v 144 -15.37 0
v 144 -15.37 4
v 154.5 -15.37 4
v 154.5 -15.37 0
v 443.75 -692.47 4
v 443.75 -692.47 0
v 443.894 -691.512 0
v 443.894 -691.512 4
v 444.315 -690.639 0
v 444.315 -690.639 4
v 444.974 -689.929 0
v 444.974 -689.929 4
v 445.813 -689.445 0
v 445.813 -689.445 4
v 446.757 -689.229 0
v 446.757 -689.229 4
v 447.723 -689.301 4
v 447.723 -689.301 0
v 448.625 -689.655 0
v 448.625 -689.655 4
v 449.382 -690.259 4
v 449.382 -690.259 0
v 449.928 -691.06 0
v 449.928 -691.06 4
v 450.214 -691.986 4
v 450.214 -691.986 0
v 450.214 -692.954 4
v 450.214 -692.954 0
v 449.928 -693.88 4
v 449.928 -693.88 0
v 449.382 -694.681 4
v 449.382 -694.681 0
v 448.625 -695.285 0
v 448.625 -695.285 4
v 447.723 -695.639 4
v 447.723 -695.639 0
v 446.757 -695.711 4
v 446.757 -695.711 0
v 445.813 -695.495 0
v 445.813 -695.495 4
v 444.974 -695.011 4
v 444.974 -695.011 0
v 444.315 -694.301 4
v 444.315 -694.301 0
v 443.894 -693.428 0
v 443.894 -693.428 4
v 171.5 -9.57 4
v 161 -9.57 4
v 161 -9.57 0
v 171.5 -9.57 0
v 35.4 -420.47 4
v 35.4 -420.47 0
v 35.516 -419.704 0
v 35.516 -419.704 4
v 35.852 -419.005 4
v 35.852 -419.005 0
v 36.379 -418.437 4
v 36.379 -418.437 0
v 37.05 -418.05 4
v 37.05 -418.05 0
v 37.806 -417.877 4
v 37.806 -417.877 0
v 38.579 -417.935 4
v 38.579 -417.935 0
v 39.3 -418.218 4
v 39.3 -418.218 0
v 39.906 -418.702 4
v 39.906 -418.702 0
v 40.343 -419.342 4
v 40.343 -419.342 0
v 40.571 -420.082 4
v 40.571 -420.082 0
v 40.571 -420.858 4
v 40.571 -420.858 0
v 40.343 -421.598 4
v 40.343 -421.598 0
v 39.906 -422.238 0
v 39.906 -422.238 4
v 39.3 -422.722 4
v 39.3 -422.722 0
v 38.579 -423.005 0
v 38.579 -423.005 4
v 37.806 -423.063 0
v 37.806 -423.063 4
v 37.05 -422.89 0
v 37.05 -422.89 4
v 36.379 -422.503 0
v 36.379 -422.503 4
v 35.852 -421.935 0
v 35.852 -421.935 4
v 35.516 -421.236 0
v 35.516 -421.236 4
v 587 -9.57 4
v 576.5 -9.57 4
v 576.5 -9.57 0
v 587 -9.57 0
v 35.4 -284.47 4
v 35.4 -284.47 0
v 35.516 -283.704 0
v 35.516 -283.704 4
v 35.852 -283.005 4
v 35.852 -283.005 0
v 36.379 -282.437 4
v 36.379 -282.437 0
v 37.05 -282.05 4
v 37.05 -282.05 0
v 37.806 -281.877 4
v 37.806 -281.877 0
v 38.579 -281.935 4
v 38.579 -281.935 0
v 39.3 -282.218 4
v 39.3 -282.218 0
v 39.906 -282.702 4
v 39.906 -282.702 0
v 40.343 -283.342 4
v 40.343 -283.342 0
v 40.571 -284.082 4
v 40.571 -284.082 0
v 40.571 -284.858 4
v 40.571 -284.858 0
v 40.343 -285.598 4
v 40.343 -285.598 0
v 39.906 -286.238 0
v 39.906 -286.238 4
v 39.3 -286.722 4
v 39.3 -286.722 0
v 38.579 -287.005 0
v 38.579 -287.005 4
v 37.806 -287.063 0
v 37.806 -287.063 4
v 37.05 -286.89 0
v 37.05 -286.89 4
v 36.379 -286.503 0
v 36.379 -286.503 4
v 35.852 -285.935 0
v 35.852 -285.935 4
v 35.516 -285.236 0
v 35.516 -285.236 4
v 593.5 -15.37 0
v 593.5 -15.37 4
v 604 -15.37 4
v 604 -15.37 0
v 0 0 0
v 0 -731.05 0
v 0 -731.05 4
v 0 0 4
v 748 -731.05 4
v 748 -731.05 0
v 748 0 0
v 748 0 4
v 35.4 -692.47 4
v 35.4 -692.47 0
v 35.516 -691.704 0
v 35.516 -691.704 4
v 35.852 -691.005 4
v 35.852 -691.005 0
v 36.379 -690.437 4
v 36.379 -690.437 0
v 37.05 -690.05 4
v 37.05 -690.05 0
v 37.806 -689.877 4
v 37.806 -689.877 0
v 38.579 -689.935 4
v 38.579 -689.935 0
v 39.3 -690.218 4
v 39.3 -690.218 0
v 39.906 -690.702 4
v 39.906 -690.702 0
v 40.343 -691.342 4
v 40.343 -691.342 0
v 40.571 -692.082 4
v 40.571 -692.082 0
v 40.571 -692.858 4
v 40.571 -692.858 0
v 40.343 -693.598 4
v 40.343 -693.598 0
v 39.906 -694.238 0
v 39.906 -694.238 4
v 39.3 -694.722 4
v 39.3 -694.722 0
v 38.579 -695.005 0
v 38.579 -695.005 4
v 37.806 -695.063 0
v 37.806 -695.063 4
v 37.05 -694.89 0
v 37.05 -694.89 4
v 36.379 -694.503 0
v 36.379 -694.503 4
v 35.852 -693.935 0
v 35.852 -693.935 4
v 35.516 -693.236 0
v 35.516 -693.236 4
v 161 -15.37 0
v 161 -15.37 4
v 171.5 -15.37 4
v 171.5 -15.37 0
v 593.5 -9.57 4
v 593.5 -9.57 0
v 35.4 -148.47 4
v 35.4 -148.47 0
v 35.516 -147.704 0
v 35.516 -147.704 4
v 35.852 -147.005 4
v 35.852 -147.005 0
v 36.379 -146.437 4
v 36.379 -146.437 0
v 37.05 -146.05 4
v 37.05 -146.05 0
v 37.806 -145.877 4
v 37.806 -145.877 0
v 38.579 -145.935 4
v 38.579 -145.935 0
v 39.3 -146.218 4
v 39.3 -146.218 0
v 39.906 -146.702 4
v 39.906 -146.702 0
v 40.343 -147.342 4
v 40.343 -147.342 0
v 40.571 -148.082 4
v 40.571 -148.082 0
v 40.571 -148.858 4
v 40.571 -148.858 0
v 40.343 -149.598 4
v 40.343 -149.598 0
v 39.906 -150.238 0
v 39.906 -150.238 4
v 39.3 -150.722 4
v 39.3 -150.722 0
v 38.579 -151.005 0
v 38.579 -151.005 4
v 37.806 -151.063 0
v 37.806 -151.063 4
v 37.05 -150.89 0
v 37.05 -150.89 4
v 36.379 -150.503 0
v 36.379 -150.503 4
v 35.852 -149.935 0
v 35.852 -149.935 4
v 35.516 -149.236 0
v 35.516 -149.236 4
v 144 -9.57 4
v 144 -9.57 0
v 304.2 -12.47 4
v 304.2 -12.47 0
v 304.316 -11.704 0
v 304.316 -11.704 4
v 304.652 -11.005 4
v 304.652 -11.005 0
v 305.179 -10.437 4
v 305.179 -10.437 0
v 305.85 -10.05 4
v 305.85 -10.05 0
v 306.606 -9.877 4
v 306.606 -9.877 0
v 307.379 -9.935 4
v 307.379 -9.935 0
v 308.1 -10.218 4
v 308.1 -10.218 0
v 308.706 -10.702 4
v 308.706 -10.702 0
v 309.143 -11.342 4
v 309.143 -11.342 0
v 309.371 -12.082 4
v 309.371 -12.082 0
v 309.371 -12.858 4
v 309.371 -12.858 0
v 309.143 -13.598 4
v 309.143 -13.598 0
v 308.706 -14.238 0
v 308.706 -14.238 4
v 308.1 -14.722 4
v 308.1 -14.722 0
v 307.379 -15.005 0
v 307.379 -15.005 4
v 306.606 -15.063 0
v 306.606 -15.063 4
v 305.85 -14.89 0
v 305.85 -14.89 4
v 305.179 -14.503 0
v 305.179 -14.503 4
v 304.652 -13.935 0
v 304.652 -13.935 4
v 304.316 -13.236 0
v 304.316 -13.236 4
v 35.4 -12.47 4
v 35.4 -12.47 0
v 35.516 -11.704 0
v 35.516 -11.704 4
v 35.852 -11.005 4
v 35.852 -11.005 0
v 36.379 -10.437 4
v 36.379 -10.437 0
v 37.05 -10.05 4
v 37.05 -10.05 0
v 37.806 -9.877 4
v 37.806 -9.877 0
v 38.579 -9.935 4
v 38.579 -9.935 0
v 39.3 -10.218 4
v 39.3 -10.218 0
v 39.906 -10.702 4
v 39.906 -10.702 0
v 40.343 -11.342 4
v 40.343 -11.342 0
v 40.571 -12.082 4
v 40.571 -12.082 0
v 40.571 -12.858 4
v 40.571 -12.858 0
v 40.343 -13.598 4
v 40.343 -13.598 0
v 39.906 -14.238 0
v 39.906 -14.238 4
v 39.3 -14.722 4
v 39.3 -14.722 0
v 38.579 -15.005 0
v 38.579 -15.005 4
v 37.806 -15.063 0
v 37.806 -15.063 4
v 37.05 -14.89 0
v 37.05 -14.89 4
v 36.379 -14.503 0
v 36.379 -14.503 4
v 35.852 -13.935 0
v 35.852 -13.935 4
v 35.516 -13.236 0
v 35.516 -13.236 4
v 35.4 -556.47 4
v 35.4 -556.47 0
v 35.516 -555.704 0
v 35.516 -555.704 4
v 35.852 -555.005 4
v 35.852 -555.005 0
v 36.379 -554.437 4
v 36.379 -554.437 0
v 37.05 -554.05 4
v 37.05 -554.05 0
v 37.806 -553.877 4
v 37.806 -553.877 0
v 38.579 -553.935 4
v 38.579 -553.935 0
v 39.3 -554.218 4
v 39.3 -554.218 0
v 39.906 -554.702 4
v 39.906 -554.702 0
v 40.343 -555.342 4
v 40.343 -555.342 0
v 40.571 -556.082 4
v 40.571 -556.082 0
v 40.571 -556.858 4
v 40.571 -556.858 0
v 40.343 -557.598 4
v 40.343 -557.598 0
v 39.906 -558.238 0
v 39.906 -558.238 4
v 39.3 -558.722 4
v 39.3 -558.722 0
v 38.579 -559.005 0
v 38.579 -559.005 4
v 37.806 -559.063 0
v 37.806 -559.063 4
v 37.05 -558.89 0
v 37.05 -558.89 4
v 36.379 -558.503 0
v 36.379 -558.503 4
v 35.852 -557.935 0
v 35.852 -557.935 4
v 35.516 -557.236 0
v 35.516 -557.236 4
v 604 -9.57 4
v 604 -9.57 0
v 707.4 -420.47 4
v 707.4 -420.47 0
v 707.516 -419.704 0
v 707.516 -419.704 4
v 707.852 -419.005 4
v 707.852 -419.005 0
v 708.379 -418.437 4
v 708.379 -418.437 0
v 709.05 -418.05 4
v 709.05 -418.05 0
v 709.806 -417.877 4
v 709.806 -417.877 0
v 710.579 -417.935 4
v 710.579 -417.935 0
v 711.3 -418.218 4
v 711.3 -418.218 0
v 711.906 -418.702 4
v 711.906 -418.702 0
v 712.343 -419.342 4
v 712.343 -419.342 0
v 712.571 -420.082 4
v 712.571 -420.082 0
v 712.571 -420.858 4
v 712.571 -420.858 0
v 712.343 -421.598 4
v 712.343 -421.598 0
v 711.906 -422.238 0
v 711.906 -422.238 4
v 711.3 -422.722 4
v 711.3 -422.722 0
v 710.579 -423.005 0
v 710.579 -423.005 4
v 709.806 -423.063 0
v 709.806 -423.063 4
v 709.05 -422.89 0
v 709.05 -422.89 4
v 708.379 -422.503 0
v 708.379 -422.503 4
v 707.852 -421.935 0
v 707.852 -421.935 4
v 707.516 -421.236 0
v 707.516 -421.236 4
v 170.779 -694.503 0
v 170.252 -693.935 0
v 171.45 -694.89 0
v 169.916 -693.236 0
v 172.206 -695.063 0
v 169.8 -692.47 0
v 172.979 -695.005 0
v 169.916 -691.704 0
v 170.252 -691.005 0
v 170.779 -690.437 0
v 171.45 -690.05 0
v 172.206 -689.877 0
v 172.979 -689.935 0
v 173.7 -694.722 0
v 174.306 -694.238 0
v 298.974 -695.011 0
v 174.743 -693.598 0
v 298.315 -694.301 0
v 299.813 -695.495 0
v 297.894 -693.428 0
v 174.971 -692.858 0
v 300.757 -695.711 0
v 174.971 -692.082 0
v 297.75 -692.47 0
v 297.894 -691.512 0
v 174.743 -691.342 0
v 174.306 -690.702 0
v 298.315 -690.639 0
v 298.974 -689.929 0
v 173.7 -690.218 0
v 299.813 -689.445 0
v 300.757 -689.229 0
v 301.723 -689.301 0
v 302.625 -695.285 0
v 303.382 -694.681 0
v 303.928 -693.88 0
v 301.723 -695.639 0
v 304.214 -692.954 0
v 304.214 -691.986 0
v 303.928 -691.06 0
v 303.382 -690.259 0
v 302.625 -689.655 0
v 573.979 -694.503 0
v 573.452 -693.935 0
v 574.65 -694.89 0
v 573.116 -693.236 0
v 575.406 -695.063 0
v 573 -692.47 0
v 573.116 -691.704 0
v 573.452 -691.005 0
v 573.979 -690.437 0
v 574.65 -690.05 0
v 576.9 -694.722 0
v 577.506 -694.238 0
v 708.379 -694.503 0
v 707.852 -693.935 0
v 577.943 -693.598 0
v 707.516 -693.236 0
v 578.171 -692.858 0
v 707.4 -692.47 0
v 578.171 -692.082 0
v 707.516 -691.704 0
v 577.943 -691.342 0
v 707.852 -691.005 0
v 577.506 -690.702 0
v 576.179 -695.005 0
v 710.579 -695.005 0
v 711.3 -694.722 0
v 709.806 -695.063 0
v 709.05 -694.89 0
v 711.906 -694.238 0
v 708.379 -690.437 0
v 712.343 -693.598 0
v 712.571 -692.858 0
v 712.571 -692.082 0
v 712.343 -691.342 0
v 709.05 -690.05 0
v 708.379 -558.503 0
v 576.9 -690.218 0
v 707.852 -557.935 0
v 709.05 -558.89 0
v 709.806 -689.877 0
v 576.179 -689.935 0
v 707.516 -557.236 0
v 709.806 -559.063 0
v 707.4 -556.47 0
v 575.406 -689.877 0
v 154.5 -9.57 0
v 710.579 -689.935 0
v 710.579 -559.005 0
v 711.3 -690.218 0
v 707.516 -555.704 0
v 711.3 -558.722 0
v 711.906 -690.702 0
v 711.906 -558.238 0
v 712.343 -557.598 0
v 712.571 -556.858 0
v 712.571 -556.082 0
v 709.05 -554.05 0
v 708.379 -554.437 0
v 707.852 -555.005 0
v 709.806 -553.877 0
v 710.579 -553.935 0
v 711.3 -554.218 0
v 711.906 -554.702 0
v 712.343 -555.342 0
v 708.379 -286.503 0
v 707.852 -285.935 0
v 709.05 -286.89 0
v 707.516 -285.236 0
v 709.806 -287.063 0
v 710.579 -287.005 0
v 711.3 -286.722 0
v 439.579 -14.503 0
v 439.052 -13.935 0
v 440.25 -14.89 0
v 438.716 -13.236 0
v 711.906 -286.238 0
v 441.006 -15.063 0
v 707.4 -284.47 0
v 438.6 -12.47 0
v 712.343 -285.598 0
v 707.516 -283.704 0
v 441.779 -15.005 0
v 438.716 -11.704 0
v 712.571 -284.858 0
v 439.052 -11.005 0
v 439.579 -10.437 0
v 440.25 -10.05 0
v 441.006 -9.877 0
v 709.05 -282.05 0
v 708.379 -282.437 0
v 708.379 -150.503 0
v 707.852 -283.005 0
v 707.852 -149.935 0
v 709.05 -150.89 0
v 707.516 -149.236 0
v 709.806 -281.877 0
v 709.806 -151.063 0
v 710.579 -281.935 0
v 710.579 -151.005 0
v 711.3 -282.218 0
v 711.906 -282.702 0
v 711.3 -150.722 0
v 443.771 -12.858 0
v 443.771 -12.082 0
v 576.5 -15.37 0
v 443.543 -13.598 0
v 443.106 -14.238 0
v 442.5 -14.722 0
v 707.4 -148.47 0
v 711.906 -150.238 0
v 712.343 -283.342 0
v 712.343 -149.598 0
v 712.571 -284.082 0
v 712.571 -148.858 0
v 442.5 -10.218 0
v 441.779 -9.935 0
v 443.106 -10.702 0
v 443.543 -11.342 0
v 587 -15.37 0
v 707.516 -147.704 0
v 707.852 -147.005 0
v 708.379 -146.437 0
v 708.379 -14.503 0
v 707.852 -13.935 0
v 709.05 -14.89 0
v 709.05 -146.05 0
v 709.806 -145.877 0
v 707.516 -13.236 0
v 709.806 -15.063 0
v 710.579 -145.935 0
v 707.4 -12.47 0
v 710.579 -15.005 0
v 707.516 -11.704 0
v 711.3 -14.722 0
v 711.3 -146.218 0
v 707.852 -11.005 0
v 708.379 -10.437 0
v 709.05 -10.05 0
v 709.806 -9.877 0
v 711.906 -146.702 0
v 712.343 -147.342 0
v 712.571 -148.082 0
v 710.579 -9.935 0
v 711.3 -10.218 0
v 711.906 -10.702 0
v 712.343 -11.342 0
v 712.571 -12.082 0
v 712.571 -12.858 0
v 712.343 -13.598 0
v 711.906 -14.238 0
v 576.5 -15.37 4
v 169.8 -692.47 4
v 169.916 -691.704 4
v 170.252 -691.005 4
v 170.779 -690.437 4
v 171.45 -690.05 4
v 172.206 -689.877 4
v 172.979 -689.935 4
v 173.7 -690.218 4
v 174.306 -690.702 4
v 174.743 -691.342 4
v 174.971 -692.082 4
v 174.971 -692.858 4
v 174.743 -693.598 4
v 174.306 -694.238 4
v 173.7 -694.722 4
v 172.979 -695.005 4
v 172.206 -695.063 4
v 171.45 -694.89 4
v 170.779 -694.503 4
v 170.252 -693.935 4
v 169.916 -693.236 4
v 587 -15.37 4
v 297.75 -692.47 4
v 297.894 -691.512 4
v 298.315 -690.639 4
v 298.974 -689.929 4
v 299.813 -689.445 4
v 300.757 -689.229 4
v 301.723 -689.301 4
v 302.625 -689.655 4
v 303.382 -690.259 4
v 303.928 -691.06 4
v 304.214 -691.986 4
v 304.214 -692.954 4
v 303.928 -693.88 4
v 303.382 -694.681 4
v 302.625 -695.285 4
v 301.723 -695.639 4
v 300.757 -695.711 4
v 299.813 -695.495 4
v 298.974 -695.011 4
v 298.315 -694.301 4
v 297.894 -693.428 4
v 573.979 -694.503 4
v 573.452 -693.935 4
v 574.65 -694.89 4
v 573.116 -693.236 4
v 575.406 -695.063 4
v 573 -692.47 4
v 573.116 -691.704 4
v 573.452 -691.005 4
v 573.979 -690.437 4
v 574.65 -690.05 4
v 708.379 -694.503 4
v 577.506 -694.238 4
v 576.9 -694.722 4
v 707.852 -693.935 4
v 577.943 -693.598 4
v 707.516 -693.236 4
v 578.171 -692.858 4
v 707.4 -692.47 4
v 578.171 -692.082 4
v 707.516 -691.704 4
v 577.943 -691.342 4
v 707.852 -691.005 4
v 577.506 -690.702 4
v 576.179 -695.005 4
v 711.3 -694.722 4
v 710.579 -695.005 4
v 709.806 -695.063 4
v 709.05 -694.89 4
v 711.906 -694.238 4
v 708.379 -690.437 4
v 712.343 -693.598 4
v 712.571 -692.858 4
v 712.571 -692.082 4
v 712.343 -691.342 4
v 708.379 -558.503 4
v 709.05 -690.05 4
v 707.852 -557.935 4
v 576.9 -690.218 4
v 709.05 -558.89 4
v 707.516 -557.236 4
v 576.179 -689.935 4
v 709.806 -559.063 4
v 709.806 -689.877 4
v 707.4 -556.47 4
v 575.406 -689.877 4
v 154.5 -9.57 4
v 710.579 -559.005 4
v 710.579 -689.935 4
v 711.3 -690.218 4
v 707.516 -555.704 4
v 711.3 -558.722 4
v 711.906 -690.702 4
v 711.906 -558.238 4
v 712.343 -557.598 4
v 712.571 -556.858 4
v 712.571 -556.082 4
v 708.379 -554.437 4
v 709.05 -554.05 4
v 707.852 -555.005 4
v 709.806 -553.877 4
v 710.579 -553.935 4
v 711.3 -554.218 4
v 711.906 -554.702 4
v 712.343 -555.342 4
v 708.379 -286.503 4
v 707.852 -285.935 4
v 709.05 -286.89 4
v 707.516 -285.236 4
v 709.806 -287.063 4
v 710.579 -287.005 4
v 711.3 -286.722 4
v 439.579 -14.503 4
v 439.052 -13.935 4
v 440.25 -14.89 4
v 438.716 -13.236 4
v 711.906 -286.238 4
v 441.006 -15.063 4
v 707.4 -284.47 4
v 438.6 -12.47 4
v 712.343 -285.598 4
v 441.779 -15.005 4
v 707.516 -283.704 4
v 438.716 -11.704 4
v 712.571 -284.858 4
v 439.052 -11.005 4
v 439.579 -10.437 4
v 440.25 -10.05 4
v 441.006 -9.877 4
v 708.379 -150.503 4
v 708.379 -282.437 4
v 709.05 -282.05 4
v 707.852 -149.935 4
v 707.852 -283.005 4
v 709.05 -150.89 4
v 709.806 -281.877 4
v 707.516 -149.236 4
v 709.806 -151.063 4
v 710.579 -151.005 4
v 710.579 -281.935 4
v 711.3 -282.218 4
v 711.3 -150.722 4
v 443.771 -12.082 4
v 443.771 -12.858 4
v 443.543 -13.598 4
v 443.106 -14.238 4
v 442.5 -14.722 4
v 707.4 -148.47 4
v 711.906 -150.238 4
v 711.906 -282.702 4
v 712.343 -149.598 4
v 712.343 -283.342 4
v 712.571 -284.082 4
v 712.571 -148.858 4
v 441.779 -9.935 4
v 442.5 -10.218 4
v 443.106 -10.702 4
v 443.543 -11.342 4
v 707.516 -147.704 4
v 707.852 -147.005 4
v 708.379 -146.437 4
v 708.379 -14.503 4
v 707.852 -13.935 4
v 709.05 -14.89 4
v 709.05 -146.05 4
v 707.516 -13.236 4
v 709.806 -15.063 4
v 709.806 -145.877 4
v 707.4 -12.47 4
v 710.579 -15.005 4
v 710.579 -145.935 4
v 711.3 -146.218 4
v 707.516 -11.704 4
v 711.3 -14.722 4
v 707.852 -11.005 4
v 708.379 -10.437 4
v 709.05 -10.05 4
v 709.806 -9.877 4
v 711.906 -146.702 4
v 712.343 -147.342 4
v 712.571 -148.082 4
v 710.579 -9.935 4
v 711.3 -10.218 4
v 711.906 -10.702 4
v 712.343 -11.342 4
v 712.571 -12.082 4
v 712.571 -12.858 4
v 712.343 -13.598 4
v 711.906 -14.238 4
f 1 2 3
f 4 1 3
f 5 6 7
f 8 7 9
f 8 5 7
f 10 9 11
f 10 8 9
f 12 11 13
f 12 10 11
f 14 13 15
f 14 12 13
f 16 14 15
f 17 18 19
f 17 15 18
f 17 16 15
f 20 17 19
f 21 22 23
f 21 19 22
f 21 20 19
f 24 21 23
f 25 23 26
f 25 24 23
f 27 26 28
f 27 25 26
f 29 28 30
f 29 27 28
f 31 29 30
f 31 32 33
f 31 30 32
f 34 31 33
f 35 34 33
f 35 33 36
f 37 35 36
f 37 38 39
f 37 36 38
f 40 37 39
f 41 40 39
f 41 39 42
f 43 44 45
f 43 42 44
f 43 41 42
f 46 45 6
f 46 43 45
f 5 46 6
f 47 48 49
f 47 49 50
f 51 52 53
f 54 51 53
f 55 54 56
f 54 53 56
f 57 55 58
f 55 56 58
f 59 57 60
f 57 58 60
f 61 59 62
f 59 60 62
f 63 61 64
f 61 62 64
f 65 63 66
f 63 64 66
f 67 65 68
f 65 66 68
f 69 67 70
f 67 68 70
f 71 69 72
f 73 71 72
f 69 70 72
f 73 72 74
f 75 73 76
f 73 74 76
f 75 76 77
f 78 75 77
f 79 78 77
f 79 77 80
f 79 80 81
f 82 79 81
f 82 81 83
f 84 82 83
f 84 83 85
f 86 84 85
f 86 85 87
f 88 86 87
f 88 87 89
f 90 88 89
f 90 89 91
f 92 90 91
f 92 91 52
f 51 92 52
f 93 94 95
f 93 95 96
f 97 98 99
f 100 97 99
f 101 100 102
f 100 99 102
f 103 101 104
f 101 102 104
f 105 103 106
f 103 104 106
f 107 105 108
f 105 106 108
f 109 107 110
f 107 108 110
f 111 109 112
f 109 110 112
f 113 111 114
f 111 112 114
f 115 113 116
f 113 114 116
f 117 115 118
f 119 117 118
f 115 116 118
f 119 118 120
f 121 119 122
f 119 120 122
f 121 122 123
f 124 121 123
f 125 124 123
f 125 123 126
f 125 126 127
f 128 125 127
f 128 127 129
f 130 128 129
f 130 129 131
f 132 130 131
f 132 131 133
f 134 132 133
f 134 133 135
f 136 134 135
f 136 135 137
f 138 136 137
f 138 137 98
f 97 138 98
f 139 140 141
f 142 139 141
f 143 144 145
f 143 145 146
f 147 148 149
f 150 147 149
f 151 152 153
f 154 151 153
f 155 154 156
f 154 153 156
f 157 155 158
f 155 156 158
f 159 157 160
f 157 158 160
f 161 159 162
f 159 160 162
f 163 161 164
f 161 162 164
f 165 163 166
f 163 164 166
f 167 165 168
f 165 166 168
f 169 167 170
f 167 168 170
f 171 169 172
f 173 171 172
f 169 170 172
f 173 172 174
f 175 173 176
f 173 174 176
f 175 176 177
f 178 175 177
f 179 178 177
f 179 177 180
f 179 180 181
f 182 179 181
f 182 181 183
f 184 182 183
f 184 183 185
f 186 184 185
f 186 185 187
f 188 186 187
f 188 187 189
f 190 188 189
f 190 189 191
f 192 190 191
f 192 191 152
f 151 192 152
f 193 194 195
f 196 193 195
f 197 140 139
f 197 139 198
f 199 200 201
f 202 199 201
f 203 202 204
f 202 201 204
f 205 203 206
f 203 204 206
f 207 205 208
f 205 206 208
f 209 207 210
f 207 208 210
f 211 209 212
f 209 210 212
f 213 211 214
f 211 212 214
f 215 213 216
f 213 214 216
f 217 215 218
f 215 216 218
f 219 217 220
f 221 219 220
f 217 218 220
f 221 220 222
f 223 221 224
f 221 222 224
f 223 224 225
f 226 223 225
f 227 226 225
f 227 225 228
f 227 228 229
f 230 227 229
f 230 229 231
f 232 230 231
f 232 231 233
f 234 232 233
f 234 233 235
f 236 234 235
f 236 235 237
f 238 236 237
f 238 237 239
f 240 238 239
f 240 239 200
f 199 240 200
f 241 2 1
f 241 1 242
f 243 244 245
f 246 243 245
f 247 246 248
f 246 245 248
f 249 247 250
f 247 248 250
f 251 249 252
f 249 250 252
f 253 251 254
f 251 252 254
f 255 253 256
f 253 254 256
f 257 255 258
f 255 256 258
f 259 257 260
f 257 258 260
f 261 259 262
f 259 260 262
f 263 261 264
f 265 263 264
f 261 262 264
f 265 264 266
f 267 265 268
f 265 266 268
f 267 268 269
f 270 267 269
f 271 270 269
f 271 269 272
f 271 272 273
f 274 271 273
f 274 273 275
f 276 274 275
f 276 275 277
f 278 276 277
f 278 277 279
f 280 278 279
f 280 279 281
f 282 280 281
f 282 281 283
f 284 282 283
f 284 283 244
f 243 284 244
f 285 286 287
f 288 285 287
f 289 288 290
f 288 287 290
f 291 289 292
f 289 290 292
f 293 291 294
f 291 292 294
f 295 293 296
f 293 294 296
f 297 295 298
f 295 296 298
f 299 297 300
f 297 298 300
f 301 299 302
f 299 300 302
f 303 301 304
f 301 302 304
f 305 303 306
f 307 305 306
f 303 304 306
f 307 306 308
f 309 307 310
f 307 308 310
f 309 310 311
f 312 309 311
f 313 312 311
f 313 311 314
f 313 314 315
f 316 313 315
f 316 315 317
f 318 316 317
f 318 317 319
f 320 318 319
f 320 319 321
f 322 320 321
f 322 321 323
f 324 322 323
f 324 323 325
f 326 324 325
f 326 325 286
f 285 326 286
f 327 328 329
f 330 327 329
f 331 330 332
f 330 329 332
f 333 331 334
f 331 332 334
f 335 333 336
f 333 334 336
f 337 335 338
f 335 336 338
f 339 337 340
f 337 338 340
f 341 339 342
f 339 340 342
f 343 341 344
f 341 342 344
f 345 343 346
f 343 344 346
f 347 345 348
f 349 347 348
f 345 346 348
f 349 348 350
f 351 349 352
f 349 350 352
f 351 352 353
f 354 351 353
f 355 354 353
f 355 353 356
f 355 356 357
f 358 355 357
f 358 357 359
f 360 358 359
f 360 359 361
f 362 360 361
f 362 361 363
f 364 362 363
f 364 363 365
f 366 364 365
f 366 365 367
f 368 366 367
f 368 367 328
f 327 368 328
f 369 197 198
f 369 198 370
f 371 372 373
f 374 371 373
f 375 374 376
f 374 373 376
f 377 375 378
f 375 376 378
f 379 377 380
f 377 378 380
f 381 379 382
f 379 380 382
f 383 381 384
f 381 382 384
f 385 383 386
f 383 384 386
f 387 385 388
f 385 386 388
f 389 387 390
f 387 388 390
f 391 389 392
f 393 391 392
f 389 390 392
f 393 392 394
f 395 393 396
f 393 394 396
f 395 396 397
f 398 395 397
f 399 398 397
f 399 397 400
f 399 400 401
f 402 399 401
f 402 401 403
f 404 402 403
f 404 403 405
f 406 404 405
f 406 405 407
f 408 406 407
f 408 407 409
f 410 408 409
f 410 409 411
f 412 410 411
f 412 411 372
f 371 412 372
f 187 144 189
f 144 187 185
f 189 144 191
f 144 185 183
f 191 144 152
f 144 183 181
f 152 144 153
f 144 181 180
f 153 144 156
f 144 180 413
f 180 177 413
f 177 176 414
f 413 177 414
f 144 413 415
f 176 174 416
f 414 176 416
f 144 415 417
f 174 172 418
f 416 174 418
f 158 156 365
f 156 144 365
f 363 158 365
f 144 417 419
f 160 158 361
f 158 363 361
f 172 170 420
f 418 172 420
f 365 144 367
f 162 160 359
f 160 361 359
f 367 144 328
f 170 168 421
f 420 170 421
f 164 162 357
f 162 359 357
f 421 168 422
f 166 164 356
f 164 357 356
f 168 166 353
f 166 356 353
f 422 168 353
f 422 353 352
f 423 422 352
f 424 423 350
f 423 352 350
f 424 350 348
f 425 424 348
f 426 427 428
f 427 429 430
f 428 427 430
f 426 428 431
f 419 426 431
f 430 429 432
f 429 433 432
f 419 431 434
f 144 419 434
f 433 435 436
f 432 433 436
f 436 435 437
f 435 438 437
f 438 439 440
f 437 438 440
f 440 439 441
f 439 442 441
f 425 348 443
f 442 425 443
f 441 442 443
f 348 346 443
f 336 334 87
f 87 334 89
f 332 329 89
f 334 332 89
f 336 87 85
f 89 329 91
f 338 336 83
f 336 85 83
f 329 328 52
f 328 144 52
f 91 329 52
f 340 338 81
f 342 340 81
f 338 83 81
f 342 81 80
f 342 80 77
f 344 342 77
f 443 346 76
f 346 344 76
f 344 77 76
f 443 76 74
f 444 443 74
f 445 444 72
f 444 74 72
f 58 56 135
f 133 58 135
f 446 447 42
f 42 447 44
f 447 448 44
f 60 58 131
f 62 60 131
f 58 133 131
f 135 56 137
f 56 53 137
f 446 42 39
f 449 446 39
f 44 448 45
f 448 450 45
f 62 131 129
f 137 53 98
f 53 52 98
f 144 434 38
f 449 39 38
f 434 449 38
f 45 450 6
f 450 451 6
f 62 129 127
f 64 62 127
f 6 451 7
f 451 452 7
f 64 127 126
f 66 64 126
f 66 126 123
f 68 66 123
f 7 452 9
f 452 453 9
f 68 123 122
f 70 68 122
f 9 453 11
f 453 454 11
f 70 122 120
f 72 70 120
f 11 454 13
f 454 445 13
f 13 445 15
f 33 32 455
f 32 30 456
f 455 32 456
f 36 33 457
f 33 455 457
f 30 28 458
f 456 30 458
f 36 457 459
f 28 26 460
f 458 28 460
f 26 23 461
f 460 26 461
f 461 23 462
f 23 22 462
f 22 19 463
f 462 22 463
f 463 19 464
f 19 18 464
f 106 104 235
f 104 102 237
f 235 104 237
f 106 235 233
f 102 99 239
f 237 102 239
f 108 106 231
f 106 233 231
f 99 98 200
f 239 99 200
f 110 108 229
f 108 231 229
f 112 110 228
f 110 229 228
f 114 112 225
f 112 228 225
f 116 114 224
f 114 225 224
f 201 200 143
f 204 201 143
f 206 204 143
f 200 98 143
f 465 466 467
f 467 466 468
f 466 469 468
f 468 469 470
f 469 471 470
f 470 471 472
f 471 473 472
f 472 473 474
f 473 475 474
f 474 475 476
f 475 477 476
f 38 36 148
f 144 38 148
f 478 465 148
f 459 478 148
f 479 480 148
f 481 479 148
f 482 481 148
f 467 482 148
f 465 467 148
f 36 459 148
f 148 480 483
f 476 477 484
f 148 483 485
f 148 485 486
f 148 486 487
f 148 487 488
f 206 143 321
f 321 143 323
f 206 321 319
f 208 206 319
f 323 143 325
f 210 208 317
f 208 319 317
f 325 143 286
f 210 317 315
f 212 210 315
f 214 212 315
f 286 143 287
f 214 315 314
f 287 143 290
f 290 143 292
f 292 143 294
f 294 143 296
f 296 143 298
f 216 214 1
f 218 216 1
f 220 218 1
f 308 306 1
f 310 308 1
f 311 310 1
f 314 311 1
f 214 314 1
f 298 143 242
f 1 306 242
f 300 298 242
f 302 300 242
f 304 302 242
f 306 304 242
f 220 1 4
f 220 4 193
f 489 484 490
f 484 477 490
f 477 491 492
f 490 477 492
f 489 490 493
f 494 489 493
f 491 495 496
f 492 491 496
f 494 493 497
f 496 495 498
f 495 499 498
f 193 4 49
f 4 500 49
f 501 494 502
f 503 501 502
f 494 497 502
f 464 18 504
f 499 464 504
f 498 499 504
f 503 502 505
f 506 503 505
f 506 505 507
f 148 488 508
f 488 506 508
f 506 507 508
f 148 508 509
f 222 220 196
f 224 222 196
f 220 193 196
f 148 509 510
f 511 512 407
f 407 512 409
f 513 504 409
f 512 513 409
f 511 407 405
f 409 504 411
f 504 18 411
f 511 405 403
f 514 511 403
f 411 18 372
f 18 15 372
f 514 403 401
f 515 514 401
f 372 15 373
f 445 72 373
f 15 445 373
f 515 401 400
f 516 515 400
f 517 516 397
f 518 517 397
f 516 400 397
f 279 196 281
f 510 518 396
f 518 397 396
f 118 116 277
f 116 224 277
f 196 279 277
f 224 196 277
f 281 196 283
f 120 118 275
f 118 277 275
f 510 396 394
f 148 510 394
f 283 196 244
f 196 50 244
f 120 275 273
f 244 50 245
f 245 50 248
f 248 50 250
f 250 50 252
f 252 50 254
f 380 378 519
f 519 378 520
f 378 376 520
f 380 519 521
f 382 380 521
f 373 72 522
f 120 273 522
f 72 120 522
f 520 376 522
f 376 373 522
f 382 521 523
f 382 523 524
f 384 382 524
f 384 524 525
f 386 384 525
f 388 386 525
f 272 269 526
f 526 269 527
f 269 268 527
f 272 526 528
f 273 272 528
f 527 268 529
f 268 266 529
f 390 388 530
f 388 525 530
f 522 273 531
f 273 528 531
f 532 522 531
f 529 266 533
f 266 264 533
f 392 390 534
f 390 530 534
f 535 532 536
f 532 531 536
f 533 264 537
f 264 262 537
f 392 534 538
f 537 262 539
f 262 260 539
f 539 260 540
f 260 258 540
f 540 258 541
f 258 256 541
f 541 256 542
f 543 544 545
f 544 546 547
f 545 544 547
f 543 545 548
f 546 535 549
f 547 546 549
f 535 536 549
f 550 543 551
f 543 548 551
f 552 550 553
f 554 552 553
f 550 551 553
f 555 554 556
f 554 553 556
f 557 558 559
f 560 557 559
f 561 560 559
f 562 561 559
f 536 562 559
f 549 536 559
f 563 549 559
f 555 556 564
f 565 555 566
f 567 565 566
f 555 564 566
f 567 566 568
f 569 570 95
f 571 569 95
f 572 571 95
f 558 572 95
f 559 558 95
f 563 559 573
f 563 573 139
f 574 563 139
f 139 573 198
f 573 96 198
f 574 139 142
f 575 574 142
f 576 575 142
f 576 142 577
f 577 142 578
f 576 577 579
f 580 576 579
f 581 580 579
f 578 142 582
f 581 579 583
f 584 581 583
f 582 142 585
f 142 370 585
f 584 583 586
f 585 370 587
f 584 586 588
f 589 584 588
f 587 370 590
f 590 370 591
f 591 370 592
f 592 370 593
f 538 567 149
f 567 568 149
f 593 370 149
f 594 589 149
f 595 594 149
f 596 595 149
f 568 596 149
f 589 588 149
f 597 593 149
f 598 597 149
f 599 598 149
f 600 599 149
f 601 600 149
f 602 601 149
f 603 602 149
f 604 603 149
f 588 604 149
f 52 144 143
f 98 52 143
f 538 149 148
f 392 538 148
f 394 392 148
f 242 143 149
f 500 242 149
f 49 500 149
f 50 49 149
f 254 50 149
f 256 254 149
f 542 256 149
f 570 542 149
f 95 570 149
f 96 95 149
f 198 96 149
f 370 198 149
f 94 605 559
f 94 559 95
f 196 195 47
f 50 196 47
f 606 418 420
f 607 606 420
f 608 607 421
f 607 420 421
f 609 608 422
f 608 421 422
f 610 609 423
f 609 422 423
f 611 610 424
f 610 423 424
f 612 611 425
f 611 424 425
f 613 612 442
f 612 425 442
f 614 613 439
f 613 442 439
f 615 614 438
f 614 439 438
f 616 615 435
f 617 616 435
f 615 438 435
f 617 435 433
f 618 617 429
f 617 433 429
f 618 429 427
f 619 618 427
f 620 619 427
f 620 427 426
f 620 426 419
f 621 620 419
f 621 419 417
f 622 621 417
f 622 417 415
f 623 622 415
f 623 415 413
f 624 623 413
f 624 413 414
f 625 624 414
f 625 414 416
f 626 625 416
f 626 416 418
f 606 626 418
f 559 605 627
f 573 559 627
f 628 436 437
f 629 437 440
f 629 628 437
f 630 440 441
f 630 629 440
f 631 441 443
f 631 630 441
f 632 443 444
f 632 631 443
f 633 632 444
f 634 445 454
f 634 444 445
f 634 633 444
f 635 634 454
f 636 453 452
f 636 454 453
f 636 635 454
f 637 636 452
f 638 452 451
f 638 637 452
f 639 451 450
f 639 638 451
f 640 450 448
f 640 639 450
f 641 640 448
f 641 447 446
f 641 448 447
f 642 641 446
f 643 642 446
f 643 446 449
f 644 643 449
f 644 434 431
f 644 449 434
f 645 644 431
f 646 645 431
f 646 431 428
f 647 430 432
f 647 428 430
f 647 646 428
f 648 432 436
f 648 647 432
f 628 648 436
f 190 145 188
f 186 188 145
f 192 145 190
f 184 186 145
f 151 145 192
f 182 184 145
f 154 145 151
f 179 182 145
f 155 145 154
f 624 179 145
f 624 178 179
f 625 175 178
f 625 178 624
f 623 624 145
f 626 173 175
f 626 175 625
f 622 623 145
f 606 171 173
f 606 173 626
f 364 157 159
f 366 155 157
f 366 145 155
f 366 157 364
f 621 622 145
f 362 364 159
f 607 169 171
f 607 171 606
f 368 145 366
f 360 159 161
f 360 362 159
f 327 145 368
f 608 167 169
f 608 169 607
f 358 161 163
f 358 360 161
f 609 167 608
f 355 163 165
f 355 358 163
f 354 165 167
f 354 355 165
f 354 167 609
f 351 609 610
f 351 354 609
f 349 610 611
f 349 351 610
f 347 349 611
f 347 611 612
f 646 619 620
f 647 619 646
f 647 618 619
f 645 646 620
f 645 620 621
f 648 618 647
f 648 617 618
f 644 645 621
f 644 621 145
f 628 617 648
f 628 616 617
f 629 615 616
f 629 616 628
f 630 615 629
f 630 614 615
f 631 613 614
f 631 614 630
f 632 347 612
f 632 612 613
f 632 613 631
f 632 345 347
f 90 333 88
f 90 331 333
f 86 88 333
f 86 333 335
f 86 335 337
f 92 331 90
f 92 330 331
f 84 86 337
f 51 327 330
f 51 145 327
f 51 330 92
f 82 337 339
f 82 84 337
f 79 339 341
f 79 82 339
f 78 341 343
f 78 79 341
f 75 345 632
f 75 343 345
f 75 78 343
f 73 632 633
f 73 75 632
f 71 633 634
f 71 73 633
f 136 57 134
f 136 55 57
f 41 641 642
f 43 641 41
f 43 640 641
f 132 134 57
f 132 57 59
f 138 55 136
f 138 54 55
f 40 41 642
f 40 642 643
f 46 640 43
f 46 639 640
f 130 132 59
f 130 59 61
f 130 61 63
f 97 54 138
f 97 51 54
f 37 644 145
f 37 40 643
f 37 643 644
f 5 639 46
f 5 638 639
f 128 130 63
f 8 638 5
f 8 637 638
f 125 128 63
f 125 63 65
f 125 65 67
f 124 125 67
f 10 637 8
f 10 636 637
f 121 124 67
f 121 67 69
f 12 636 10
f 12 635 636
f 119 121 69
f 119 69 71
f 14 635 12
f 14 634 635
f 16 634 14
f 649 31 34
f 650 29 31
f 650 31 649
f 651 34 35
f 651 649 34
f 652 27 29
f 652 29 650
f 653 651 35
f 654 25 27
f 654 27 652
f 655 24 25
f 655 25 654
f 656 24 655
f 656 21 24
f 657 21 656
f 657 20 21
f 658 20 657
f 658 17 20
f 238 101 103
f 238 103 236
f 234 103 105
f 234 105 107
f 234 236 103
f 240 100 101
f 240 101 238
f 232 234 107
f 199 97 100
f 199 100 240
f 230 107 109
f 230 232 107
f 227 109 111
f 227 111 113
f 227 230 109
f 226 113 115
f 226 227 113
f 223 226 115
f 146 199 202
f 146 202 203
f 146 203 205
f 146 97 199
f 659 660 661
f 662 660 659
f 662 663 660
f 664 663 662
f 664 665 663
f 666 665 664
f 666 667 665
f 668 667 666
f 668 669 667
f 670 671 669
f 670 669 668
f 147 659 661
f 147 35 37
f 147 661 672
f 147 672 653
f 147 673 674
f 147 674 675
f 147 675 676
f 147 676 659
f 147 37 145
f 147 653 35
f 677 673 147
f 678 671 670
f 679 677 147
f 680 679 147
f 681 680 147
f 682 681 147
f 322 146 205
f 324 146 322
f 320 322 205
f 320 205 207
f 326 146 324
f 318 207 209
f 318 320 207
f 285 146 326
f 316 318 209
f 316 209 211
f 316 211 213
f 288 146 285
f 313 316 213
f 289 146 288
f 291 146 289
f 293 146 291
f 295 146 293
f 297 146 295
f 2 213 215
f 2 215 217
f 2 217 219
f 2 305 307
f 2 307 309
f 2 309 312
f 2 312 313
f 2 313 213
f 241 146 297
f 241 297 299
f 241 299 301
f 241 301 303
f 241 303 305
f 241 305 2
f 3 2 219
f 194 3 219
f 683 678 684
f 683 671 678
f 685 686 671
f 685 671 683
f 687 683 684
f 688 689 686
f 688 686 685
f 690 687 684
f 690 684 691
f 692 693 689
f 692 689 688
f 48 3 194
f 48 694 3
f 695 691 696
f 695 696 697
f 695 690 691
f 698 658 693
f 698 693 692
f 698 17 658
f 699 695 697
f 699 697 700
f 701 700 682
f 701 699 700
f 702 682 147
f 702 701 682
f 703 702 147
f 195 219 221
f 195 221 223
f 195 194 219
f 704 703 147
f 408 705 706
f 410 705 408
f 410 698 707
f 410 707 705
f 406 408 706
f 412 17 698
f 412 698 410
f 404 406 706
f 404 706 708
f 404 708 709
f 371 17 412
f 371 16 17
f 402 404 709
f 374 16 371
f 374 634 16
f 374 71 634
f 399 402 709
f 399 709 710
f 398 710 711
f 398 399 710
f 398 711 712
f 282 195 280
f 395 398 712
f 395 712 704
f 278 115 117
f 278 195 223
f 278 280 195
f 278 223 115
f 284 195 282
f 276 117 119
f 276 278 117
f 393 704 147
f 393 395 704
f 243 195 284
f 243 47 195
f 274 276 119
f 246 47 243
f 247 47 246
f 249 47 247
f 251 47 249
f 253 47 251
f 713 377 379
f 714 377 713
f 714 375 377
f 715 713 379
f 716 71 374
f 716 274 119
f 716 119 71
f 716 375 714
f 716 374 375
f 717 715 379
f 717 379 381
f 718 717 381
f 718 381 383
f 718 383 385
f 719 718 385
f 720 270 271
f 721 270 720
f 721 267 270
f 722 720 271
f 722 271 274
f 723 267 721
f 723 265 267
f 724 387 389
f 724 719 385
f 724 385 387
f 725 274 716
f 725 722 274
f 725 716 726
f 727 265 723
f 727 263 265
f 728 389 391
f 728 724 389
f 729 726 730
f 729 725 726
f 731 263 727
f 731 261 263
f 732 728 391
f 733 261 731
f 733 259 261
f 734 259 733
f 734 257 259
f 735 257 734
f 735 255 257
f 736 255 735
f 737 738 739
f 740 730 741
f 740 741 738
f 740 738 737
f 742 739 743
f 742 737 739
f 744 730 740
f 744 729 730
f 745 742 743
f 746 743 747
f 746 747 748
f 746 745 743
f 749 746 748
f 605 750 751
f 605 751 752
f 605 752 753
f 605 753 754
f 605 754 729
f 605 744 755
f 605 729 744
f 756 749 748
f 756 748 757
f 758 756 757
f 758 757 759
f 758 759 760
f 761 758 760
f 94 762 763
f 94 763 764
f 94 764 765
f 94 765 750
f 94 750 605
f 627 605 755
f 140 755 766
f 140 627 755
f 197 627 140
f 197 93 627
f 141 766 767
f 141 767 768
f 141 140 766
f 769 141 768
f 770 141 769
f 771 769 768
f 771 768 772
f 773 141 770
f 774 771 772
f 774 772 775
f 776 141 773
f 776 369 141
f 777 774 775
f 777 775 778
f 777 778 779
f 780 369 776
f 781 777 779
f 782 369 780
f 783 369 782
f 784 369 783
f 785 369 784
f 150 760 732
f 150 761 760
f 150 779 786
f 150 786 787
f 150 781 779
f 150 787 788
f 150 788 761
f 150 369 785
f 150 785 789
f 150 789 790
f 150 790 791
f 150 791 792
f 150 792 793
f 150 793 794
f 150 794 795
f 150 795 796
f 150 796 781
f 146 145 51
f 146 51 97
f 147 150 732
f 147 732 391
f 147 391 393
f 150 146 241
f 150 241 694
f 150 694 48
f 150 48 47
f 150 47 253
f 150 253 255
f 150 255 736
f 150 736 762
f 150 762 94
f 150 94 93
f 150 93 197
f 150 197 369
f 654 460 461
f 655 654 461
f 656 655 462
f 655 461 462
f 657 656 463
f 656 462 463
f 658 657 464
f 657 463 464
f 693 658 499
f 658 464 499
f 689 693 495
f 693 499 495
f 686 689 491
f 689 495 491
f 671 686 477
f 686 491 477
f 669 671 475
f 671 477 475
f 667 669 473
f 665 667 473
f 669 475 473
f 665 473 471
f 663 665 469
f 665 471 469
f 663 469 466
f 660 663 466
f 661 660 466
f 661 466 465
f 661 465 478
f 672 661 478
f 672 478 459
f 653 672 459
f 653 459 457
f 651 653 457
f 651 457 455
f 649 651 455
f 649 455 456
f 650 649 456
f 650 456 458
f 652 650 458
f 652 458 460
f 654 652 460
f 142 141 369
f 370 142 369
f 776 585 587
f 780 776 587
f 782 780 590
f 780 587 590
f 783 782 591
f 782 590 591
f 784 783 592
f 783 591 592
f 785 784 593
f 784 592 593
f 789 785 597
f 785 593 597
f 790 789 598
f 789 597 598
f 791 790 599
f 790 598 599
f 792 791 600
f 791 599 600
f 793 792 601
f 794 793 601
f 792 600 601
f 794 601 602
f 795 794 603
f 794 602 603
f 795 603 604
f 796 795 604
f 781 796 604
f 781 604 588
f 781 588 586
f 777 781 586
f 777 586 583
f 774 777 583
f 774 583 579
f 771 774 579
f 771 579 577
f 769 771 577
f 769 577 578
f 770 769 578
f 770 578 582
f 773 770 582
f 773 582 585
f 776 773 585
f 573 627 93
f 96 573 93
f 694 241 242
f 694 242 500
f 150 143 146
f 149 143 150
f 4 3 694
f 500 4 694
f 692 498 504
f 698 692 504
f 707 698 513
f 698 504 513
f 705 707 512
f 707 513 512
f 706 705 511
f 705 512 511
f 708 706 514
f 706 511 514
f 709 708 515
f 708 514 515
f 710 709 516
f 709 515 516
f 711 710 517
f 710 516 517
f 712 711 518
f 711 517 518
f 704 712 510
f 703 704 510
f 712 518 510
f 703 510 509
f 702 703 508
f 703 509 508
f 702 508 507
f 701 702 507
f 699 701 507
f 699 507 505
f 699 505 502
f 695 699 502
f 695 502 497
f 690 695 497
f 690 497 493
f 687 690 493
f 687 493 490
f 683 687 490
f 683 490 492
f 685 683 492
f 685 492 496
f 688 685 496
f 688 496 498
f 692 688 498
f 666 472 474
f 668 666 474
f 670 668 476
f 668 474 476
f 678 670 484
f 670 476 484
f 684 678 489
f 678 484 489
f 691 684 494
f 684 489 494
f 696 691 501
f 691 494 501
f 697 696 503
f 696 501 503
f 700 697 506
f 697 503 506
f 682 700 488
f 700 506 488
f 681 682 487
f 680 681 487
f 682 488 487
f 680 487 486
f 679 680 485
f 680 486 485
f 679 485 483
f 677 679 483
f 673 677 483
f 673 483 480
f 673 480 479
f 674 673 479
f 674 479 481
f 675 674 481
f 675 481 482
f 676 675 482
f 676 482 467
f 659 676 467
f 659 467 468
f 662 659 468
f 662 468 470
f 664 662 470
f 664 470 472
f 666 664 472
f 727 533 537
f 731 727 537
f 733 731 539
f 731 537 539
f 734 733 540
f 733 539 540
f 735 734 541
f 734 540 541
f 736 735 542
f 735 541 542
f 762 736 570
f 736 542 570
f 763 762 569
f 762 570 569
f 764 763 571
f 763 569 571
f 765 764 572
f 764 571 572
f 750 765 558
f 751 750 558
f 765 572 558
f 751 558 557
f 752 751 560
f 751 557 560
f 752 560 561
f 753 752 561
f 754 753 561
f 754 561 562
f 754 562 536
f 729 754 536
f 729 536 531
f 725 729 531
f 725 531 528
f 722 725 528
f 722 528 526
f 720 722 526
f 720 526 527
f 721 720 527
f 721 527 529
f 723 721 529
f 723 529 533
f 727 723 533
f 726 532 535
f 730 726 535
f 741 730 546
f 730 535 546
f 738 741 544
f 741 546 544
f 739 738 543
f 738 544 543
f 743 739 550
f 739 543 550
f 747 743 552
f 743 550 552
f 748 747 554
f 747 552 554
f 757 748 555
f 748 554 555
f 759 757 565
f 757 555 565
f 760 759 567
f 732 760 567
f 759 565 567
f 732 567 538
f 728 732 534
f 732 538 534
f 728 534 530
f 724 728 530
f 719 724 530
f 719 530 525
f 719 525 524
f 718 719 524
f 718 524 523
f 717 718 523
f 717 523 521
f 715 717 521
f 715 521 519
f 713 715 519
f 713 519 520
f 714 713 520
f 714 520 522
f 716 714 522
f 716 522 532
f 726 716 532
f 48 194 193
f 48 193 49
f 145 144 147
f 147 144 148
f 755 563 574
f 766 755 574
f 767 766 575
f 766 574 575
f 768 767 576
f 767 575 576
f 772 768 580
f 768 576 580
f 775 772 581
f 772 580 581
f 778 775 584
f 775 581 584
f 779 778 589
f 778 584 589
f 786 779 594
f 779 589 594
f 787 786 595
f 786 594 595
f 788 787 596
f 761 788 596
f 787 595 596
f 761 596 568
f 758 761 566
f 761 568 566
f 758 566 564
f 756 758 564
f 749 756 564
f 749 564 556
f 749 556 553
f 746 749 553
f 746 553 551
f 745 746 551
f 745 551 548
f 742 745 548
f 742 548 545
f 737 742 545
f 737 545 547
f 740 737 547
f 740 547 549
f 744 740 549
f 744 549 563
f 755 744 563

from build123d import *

# Parameters (mm, degrees)
SKETCH_1_W          = 748
SKETCH_1_H          = 731.05
EXTRUDE_1_DEPTH     = 4
SKETCH_2_W          = 10.5
SKETCH_2_H          = 5.8
CUT_EXTRUDE_1_DEPTH = 1046.922608275
SKETCH_4_R          = 3.25
CUT_EXTRUDE_2_DEPTH = 1044.130721674
SKETCH_5_R          = 2.6
CUT_EXTRUDE_3_DEPTH = 1046.922608275


with BuildPart() as part:
    # Эскиз1 → Бобышка-Вытянуть1 (new body)
    with BuildSketch(Plane.XY):
        with Locations((374, -365.525)):
            Rectangle(SKETCH_1_W, SKETCH_1_H)
    extrude(amount=EXTRUDE_1_DEPTH)

    # Эскиз2 → Вырез-Вытянуть1 (cut, through all)
    with BuildSketch(Plane.XY.offset(4)):
        with Locations((149.25, -12.47)):
            Rectangle(SKETCH_2_W, SKETCH_2_H)
        with Locations((166.25, -12.47)):
            Rectangle(SKETCH_2_W, SKETCH_2_H)
        with Locations((581.75, -12.47)):
            Rectangle(SKETCH_2_W, SKETCH_2_H)
        with Locations((598.75, -12.47)):
            Rectangle(SKETCH_2_W, SKETCH_2_H)
    extrude(amount=-CUT_EXTRUDE_1_DEPTH, mode=Mode.SUBTRACT)

    # Эскиз4 → Вырез-Вытянуть2 (cut, through all)
    with BuildSketch(Plane(origin=(0, -727.05, 4), x_dir=(1, 0, 0), z_dir=(0, 0, -1))):
        with Locations(Location((301, -34.58, 0), (0, 0, 180))):
            Circle(SKETCH_4_R)
        with Locations(Location((447, -34.58, 0), (0, 0, 180))):
            Circle(SKETCH_4_R)
    extrude(amount=CUT_EXTRUDE_2_DEPTH, mode=Mode.SUBTRACT)

    # Эскиз5 → Вырез-Вытянуть3 (cut, through all)
    with BuildSketch(Plane(origin=(0, 0, 0), x_dir=(-1, 0, 0), z_dir=(0, 0, -1))):
        with Locations((-710, -12.47)):
            Circle(SKETCH_5_R)
        with Locations((-441.2, -12.47)):
            Circle(SKETCH_5_R)
        with Locations((-306.8, -12.47)):
            Circle(SKETCH_5_R)
        with Locations((-38, -12.47)):
            Circle(SKETCH_5_R)
        with Locations((-710, -148.47)):
            Circle(SKETCH_5_R)
        with Locations((-710, -284.47)):
            Circle(SKETCH_5_R)
        with Locations((-710, -420.47)):
            Circle(SKETCH_5_R)
        with Locations((-710, -556.47)):
            Circle(SKETCH_5_R)
        with Locations((-710, -692.47)):
            Circle(SKETCH_5_R)
        with Locations((-575.6, -692.47)):
            Circle(SKETCH_5_R)
        with Locations((-172.4, -692.47)):
            Circle(SKETCH_5_R)
        with Locations((-38, -148.47)):
            Circle(SKETCH_5_R)
        with Locations((-38, -284.47)):
            Circle(SKETCH_5_R)
        with Locations((-38, -420.47)):
            Circle(SKETCH_5_R)
        with Locations((-38, -556.47)):
            Circle(SKETCH_5_R)
        with Locations((-38, -692.47)):
            Circle(SKETCH_5_R)
    extrude(amount=-CUT_EXTRUDE_3_DEPTH, mode=Mode.SUBTRACT)


solid = part.part
